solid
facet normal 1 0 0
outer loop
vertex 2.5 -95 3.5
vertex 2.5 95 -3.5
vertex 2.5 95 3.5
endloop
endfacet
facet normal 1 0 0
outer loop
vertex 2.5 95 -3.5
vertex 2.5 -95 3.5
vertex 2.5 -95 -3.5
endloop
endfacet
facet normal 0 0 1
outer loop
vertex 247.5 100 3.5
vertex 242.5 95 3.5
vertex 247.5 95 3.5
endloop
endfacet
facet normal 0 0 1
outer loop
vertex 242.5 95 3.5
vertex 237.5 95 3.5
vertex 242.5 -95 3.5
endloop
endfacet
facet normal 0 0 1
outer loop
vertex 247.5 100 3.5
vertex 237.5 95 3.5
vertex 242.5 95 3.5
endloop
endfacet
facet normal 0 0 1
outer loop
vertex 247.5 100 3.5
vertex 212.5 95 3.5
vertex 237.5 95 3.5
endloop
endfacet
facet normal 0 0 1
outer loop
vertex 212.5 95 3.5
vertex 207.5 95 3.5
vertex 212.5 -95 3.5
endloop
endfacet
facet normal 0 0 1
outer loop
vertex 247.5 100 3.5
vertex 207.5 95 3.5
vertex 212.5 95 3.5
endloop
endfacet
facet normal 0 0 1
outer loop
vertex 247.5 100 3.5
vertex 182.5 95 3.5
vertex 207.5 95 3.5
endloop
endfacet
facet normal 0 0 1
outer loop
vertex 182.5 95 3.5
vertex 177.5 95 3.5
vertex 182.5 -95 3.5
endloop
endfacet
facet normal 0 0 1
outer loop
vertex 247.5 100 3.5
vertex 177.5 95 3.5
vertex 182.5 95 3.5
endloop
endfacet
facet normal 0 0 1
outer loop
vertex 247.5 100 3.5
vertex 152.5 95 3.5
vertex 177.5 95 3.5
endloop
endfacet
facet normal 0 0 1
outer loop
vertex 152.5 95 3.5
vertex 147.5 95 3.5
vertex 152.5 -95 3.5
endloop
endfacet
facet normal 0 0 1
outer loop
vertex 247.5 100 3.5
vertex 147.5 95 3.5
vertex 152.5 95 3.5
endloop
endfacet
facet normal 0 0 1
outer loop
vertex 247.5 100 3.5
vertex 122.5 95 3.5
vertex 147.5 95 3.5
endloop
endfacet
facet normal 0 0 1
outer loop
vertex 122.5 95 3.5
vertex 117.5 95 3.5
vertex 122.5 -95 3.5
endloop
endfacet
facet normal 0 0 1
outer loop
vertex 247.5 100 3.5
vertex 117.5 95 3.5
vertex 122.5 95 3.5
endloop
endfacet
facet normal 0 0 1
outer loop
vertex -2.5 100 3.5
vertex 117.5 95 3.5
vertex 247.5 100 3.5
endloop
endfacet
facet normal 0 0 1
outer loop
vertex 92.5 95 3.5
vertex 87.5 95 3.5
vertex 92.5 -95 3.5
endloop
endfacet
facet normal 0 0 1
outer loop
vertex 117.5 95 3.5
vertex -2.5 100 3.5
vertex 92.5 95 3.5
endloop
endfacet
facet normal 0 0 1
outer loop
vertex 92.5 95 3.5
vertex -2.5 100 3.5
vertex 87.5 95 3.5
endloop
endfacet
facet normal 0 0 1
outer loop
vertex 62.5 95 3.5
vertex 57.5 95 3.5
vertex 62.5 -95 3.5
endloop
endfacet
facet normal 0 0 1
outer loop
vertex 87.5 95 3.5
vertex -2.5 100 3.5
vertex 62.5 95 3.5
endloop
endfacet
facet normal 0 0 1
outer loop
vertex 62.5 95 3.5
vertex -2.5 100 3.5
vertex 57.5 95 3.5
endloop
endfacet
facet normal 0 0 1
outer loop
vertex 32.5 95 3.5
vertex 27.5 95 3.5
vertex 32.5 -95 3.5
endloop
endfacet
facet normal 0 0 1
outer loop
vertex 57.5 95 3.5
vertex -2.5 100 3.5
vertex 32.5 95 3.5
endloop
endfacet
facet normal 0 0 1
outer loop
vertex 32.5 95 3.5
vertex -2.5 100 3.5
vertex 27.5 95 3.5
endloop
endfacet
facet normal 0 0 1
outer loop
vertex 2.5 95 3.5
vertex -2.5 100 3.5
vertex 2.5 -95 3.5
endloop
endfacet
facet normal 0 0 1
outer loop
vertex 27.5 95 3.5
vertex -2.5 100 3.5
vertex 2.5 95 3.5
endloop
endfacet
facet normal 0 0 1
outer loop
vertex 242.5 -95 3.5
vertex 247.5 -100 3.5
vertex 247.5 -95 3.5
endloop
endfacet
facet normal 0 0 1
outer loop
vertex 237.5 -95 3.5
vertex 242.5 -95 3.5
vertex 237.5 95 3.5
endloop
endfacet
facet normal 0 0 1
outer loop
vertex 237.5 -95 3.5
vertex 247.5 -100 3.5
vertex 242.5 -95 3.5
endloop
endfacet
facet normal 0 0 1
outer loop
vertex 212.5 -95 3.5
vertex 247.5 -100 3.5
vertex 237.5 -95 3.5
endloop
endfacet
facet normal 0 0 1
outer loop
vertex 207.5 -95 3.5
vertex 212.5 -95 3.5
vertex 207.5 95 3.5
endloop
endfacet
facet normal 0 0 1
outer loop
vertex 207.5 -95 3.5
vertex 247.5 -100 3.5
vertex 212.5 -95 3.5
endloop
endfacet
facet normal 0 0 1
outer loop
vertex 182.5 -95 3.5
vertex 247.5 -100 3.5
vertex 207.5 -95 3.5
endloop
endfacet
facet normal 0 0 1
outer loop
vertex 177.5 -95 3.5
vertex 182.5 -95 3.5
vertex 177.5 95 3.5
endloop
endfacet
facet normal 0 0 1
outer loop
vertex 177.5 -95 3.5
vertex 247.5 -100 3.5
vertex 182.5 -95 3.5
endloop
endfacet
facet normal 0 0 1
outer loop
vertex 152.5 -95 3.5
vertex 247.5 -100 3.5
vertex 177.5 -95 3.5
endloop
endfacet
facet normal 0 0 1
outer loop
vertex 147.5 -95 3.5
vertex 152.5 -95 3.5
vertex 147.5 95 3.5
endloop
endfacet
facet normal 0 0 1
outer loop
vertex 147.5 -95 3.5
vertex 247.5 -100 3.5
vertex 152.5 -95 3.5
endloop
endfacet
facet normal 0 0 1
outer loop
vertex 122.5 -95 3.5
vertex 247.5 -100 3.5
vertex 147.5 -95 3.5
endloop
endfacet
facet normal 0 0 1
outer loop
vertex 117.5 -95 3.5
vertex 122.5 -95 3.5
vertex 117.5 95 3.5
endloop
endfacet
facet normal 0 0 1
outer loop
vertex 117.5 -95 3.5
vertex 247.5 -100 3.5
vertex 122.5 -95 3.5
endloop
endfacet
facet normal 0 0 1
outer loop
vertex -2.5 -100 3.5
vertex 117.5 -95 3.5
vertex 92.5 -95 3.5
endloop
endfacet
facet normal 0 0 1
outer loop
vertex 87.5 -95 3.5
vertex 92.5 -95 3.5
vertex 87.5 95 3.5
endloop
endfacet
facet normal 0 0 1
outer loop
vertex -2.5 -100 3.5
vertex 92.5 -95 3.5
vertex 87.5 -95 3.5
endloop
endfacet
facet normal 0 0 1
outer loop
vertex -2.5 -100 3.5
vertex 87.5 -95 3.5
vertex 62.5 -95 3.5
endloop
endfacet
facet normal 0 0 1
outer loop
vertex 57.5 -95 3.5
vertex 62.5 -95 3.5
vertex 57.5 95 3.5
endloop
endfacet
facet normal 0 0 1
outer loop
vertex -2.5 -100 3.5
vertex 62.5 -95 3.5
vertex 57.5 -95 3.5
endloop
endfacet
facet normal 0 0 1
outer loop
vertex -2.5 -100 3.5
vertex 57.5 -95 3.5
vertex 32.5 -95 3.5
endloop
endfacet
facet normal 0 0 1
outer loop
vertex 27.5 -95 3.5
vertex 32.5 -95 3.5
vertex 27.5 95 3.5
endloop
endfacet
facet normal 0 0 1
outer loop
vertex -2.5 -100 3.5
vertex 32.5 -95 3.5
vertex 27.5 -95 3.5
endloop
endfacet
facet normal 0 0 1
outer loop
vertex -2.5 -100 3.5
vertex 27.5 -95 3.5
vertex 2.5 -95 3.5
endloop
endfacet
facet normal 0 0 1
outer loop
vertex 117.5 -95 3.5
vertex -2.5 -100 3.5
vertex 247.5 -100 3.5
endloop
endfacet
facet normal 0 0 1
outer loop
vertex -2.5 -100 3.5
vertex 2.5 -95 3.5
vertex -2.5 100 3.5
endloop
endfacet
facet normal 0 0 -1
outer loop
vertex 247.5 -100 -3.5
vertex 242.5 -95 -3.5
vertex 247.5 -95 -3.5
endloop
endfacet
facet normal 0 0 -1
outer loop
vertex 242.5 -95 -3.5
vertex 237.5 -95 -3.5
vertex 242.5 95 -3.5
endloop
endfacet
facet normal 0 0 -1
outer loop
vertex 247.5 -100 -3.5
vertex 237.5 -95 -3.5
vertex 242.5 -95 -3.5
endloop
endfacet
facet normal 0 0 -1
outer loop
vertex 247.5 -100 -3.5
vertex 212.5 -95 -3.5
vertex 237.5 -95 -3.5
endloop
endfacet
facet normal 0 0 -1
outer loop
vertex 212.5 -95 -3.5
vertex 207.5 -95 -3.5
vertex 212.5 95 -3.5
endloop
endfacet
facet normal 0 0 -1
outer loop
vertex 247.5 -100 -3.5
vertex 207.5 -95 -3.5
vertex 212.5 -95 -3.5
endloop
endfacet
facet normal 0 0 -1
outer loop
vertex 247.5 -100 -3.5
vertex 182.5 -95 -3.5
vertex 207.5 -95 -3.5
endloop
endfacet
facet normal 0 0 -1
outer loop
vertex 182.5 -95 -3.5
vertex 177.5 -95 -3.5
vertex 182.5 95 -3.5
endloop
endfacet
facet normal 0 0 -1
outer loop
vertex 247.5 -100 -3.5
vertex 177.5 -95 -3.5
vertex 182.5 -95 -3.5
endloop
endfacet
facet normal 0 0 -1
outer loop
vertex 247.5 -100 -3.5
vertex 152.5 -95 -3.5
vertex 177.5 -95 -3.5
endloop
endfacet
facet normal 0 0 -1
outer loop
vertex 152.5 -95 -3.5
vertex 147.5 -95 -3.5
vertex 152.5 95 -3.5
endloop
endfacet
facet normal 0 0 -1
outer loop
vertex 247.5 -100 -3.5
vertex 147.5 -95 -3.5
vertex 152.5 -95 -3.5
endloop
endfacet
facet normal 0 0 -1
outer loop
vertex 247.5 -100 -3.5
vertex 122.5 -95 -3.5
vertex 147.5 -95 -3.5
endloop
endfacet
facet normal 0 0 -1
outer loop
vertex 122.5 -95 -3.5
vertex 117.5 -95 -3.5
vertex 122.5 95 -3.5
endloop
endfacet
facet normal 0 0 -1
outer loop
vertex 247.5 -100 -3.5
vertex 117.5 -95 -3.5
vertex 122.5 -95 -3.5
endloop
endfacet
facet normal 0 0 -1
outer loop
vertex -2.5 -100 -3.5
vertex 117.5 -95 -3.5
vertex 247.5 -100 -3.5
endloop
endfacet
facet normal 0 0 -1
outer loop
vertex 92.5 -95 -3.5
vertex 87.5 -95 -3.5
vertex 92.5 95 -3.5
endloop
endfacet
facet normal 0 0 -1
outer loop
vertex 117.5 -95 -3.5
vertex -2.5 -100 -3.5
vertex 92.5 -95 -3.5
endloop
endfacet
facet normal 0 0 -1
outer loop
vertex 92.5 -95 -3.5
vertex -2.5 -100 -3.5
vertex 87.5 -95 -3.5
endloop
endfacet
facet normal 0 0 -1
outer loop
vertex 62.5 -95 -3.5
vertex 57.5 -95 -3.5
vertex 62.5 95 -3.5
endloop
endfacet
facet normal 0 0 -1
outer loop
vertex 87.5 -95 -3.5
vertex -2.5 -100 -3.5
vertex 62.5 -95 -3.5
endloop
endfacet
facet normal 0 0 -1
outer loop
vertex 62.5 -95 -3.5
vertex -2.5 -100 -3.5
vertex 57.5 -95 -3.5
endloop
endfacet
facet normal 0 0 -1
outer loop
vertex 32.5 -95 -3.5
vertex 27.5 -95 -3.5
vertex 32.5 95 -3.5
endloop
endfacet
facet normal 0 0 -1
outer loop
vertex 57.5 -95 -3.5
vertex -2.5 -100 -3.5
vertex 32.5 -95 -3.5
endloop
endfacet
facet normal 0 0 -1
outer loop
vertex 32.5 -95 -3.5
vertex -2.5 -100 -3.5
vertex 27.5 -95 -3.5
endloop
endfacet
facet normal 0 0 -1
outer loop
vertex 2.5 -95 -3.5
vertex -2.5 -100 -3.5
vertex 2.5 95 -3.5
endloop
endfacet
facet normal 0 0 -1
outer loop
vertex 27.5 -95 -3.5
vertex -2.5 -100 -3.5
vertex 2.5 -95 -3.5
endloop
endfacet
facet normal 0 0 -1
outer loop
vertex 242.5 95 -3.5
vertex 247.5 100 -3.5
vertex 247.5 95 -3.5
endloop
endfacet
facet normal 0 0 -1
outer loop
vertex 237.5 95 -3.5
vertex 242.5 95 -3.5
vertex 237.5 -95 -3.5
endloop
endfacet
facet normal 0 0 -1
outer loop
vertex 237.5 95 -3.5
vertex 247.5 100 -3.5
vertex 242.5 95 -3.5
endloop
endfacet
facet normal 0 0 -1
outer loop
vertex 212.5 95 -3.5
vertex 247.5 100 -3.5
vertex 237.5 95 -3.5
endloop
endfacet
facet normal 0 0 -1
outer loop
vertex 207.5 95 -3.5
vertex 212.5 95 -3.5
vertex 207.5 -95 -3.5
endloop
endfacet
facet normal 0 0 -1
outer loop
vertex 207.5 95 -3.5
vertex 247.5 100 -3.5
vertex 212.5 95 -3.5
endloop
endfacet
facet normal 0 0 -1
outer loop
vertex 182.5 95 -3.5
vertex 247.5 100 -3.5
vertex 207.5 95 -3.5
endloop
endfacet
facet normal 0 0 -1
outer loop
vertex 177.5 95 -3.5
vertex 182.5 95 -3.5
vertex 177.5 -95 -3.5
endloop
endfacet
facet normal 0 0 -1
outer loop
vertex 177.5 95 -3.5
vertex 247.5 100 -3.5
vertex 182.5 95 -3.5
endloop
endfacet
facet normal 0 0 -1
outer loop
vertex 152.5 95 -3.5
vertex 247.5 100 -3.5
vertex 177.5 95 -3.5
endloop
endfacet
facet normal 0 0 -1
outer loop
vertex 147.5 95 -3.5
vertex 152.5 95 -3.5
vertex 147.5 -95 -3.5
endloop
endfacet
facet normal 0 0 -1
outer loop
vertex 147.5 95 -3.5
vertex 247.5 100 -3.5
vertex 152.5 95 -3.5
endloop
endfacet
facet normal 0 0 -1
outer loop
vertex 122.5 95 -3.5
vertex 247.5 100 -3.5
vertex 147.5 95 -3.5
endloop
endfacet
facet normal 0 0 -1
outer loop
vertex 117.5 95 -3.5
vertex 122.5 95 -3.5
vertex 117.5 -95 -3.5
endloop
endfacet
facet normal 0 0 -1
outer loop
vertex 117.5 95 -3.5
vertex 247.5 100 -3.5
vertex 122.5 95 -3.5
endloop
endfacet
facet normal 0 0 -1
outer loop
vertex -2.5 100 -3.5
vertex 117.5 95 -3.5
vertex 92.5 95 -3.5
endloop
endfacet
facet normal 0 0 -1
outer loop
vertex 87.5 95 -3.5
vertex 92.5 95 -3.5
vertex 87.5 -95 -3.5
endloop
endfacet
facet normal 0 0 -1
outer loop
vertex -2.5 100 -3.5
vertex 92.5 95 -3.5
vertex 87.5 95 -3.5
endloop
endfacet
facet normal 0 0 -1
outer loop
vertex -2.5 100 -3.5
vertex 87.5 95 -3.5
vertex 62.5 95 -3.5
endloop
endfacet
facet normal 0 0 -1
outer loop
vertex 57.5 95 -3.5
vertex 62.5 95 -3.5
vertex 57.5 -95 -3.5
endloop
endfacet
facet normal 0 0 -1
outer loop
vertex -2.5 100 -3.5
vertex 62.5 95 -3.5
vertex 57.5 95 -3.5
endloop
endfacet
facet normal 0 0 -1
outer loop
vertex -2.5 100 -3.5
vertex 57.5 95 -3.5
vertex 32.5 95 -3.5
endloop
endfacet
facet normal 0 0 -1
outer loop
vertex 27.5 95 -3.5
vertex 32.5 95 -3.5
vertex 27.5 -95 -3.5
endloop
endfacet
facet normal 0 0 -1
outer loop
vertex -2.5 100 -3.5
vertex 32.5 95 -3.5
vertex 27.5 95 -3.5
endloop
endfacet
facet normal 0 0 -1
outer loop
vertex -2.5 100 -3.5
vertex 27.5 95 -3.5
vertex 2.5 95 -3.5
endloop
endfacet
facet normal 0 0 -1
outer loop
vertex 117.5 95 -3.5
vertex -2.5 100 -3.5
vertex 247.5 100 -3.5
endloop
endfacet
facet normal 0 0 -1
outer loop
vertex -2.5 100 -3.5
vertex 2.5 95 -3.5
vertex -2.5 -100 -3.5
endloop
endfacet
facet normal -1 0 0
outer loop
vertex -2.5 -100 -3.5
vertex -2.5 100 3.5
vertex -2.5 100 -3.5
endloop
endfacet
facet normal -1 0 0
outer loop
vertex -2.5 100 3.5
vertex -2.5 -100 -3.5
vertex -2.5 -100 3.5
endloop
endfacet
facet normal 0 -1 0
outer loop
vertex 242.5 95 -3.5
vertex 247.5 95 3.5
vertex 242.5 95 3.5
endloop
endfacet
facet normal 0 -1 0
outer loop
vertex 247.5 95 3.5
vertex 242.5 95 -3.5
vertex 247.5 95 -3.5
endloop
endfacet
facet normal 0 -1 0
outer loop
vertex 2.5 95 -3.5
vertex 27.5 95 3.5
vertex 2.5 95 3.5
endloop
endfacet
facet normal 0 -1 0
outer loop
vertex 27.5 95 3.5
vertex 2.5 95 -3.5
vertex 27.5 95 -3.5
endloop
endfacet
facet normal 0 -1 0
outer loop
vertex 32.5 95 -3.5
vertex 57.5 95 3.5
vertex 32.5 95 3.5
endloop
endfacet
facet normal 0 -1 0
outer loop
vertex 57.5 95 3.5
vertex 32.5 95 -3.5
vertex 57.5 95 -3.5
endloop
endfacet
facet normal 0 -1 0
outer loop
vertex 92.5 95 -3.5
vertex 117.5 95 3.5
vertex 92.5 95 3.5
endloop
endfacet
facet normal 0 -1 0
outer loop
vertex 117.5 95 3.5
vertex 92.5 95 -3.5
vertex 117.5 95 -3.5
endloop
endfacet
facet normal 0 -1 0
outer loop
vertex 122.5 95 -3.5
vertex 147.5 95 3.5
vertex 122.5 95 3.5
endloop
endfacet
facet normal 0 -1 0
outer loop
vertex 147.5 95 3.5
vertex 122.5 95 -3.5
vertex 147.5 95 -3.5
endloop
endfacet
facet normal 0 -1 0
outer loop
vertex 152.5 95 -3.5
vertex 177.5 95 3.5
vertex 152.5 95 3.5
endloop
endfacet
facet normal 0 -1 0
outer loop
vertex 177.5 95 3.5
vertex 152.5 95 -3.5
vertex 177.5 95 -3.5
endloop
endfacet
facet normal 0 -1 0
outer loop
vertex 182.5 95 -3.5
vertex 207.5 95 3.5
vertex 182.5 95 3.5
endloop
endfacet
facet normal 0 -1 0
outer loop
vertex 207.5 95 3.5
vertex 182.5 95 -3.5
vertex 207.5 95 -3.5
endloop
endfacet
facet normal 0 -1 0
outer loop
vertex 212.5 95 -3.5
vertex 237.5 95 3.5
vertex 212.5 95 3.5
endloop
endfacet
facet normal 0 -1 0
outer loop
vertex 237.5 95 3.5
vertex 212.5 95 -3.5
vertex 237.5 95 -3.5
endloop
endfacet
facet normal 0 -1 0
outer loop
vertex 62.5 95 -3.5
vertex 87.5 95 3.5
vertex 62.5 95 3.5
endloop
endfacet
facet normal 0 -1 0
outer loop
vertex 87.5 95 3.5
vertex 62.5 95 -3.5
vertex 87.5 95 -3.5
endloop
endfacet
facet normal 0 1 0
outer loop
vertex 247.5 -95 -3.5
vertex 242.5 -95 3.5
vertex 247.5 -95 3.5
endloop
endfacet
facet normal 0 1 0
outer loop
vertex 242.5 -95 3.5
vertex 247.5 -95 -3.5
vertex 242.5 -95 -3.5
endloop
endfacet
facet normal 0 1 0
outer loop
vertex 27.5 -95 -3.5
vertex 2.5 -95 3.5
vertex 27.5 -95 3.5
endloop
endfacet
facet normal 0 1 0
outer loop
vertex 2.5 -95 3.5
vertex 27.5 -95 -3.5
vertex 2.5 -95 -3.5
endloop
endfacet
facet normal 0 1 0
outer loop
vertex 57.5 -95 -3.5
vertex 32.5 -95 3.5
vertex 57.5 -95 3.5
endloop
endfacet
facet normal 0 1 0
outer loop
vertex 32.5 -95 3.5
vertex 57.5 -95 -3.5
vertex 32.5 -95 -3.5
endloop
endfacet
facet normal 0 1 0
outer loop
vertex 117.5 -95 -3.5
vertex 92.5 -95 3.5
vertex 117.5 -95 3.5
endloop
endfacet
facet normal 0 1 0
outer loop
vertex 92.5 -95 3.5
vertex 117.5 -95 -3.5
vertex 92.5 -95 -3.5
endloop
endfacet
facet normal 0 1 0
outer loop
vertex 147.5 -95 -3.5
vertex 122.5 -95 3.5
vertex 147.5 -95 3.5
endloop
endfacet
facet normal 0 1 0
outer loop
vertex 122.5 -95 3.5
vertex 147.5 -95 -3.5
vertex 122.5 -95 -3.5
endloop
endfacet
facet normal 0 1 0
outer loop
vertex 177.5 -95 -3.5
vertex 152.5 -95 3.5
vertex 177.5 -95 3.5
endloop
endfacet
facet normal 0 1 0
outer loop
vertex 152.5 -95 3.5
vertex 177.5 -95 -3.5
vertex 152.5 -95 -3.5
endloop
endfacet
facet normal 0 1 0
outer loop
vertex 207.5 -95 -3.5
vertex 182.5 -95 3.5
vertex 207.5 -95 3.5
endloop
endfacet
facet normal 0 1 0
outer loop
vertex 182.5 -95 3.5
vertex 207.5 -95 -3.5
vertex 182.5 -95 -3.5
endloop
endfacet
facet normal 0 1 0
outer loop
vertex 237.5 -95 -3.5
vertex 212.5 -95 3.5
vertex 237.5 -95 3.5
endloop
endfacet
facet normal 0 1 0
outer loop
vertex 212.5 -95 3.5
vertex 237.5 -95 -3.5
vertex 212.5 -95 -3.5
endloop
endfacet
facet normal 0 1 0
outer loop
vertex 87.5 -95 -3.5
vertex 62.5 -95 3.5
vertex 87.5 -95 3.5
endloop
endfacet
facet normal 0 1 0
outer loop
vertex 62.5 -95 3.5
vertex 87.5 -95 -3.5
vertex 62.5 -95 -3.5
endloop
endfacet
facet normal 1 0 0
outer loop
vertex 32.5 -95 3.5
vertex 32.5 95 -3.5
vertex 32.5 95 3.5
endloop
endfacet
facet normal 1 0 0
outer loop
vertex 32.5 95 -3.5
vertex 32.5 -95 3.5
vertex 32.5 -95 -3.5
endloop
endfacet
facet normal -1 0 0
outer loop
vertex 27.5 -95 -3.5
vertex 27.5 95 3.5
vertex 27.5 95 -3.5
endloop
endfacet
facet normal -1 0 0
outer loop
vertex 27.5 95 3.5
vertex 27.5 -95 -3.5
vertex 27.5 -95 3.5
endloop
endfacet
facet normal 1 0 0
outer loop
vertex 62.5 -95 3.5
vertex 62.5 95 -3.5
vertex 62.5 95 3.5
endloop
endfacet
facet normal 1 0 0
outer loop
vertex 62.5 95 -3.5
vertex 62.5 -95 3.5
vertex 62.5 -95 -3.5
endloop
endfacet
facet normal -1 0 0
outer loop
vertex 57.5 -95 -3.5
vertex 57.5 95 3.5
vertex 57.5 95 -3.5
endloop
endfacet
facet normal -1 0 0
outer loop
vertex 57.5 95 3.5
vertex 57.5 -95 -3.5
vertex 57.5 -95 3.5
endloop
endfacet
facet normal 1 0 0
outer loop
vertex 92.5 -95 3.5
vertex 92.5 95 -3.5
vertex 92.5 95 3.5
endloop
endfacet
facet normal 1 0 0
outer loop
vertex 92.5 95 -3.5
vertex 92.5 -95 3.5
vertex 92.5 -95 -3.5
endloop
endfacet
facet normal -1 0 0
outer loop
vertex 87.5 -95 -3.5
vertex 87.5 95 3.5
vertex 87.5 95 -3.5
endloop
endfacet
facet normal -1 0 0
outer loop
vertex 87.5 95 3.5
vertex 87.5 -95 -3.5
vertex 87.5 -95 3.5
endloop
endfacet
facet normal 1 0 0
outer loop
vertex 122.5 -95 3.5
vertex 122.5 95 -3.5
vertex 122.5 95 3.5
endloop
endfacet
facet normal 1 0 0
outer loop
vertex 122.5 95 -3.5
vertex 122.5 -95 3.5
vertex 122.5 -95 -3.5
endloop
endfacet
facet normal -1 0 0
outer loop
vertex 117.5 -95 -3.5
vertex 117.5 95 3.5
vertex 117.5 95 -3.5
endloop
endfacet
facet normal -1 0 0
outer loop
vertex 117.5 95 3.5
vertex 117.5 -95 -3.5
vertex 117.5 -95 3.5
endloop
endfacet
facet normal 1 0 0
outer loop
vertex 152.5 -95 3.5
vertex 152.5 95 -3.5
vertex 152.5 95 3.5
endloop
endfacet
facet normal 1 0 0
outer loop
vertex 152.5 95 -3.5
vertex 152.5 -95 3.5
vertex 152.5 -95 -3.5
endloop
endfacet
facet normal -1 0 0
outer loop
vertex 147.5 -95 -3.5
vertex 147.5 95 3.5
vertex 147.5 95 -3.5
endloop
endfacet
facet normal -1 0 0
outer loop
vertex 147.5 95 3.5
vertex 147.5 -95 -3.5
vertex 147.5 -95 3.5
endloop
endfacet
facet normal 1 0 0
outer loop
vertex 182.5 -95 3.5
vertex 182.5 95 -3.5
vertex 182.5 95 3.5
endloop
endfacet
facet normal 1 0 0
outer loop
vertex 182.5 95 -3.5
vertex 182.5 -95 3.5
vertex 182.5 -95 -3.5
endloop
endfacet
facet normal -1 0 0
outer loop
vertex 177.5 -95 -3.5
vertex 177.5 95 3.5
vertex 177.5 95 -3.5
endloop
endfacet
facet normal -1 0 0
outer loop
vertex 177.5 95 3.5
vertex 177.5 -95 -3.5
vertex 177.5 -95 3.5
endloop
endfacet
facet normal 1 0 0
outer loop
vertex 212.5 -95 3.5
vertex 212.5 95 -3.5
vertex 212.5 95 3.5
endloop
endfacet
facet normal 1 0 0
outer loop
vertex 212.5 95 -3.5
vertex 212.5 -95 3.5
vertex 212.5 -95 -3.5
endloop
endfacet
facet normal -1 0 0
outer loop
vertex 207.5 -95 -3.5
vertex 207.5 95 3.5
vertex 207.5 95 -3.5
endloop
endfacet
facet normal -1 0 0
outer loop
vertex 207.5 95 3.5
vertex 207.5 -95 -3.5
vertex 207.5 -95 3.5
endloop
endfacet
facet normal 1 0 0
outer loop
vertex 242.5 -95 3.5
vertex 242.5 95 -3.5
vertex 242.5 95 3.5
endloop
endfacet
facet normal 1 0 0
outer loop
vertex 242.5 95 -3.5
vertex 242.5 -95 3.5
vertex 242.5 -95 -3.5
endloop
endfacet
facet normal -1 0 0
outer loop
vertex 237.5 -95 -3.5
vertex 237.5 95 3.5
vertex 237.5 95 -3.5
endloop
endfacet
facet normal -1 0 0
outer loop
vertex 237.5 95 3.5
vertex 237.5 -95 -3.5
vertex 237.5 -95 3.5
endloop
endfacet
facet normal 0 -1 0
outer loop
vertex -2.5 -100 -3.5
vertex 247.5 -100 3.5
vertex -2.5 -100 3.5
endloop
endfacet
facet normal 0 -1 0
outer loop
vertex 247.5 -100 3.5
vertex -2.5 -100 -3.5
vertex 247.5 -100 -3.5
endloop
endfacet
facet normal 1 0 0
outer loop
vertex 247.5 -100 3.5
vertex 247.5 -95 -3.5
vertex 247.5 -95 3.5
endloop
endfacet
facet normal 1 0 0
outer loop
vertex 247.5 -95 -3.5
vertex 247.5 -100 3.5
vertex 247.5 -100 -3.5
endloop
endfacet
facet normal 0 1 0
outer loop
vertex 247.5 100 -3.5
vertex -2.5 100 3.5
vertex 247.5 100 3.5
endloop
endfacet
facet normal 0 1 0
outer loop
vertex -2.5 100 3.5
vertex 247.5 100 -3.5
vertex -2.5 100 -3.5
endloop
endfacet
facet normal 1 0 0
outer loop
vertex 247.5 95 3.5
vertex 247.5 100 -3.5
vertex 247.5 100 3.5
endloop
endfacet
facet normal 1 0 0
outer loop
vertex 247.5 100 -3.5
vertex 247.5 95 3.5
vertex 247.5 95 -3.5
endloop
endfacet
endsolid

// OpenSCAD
// Terrasse Unterkonstruktion


module Latte(L) {
    
    cube([5,L,7],center=true);
    
}


module Latten() {
    
    for (i=[0:30:250]) {
        translate([i,0,0])
        Latte(190);
    }
}
translate([250/2-2.5,-190/2-2.5,0])
rotate([0,0,90])
Latte(250);
Latten();
translate([250/2-2.5,190/2+2.5,0])
rotate([0,0,90])
Latte(250);
